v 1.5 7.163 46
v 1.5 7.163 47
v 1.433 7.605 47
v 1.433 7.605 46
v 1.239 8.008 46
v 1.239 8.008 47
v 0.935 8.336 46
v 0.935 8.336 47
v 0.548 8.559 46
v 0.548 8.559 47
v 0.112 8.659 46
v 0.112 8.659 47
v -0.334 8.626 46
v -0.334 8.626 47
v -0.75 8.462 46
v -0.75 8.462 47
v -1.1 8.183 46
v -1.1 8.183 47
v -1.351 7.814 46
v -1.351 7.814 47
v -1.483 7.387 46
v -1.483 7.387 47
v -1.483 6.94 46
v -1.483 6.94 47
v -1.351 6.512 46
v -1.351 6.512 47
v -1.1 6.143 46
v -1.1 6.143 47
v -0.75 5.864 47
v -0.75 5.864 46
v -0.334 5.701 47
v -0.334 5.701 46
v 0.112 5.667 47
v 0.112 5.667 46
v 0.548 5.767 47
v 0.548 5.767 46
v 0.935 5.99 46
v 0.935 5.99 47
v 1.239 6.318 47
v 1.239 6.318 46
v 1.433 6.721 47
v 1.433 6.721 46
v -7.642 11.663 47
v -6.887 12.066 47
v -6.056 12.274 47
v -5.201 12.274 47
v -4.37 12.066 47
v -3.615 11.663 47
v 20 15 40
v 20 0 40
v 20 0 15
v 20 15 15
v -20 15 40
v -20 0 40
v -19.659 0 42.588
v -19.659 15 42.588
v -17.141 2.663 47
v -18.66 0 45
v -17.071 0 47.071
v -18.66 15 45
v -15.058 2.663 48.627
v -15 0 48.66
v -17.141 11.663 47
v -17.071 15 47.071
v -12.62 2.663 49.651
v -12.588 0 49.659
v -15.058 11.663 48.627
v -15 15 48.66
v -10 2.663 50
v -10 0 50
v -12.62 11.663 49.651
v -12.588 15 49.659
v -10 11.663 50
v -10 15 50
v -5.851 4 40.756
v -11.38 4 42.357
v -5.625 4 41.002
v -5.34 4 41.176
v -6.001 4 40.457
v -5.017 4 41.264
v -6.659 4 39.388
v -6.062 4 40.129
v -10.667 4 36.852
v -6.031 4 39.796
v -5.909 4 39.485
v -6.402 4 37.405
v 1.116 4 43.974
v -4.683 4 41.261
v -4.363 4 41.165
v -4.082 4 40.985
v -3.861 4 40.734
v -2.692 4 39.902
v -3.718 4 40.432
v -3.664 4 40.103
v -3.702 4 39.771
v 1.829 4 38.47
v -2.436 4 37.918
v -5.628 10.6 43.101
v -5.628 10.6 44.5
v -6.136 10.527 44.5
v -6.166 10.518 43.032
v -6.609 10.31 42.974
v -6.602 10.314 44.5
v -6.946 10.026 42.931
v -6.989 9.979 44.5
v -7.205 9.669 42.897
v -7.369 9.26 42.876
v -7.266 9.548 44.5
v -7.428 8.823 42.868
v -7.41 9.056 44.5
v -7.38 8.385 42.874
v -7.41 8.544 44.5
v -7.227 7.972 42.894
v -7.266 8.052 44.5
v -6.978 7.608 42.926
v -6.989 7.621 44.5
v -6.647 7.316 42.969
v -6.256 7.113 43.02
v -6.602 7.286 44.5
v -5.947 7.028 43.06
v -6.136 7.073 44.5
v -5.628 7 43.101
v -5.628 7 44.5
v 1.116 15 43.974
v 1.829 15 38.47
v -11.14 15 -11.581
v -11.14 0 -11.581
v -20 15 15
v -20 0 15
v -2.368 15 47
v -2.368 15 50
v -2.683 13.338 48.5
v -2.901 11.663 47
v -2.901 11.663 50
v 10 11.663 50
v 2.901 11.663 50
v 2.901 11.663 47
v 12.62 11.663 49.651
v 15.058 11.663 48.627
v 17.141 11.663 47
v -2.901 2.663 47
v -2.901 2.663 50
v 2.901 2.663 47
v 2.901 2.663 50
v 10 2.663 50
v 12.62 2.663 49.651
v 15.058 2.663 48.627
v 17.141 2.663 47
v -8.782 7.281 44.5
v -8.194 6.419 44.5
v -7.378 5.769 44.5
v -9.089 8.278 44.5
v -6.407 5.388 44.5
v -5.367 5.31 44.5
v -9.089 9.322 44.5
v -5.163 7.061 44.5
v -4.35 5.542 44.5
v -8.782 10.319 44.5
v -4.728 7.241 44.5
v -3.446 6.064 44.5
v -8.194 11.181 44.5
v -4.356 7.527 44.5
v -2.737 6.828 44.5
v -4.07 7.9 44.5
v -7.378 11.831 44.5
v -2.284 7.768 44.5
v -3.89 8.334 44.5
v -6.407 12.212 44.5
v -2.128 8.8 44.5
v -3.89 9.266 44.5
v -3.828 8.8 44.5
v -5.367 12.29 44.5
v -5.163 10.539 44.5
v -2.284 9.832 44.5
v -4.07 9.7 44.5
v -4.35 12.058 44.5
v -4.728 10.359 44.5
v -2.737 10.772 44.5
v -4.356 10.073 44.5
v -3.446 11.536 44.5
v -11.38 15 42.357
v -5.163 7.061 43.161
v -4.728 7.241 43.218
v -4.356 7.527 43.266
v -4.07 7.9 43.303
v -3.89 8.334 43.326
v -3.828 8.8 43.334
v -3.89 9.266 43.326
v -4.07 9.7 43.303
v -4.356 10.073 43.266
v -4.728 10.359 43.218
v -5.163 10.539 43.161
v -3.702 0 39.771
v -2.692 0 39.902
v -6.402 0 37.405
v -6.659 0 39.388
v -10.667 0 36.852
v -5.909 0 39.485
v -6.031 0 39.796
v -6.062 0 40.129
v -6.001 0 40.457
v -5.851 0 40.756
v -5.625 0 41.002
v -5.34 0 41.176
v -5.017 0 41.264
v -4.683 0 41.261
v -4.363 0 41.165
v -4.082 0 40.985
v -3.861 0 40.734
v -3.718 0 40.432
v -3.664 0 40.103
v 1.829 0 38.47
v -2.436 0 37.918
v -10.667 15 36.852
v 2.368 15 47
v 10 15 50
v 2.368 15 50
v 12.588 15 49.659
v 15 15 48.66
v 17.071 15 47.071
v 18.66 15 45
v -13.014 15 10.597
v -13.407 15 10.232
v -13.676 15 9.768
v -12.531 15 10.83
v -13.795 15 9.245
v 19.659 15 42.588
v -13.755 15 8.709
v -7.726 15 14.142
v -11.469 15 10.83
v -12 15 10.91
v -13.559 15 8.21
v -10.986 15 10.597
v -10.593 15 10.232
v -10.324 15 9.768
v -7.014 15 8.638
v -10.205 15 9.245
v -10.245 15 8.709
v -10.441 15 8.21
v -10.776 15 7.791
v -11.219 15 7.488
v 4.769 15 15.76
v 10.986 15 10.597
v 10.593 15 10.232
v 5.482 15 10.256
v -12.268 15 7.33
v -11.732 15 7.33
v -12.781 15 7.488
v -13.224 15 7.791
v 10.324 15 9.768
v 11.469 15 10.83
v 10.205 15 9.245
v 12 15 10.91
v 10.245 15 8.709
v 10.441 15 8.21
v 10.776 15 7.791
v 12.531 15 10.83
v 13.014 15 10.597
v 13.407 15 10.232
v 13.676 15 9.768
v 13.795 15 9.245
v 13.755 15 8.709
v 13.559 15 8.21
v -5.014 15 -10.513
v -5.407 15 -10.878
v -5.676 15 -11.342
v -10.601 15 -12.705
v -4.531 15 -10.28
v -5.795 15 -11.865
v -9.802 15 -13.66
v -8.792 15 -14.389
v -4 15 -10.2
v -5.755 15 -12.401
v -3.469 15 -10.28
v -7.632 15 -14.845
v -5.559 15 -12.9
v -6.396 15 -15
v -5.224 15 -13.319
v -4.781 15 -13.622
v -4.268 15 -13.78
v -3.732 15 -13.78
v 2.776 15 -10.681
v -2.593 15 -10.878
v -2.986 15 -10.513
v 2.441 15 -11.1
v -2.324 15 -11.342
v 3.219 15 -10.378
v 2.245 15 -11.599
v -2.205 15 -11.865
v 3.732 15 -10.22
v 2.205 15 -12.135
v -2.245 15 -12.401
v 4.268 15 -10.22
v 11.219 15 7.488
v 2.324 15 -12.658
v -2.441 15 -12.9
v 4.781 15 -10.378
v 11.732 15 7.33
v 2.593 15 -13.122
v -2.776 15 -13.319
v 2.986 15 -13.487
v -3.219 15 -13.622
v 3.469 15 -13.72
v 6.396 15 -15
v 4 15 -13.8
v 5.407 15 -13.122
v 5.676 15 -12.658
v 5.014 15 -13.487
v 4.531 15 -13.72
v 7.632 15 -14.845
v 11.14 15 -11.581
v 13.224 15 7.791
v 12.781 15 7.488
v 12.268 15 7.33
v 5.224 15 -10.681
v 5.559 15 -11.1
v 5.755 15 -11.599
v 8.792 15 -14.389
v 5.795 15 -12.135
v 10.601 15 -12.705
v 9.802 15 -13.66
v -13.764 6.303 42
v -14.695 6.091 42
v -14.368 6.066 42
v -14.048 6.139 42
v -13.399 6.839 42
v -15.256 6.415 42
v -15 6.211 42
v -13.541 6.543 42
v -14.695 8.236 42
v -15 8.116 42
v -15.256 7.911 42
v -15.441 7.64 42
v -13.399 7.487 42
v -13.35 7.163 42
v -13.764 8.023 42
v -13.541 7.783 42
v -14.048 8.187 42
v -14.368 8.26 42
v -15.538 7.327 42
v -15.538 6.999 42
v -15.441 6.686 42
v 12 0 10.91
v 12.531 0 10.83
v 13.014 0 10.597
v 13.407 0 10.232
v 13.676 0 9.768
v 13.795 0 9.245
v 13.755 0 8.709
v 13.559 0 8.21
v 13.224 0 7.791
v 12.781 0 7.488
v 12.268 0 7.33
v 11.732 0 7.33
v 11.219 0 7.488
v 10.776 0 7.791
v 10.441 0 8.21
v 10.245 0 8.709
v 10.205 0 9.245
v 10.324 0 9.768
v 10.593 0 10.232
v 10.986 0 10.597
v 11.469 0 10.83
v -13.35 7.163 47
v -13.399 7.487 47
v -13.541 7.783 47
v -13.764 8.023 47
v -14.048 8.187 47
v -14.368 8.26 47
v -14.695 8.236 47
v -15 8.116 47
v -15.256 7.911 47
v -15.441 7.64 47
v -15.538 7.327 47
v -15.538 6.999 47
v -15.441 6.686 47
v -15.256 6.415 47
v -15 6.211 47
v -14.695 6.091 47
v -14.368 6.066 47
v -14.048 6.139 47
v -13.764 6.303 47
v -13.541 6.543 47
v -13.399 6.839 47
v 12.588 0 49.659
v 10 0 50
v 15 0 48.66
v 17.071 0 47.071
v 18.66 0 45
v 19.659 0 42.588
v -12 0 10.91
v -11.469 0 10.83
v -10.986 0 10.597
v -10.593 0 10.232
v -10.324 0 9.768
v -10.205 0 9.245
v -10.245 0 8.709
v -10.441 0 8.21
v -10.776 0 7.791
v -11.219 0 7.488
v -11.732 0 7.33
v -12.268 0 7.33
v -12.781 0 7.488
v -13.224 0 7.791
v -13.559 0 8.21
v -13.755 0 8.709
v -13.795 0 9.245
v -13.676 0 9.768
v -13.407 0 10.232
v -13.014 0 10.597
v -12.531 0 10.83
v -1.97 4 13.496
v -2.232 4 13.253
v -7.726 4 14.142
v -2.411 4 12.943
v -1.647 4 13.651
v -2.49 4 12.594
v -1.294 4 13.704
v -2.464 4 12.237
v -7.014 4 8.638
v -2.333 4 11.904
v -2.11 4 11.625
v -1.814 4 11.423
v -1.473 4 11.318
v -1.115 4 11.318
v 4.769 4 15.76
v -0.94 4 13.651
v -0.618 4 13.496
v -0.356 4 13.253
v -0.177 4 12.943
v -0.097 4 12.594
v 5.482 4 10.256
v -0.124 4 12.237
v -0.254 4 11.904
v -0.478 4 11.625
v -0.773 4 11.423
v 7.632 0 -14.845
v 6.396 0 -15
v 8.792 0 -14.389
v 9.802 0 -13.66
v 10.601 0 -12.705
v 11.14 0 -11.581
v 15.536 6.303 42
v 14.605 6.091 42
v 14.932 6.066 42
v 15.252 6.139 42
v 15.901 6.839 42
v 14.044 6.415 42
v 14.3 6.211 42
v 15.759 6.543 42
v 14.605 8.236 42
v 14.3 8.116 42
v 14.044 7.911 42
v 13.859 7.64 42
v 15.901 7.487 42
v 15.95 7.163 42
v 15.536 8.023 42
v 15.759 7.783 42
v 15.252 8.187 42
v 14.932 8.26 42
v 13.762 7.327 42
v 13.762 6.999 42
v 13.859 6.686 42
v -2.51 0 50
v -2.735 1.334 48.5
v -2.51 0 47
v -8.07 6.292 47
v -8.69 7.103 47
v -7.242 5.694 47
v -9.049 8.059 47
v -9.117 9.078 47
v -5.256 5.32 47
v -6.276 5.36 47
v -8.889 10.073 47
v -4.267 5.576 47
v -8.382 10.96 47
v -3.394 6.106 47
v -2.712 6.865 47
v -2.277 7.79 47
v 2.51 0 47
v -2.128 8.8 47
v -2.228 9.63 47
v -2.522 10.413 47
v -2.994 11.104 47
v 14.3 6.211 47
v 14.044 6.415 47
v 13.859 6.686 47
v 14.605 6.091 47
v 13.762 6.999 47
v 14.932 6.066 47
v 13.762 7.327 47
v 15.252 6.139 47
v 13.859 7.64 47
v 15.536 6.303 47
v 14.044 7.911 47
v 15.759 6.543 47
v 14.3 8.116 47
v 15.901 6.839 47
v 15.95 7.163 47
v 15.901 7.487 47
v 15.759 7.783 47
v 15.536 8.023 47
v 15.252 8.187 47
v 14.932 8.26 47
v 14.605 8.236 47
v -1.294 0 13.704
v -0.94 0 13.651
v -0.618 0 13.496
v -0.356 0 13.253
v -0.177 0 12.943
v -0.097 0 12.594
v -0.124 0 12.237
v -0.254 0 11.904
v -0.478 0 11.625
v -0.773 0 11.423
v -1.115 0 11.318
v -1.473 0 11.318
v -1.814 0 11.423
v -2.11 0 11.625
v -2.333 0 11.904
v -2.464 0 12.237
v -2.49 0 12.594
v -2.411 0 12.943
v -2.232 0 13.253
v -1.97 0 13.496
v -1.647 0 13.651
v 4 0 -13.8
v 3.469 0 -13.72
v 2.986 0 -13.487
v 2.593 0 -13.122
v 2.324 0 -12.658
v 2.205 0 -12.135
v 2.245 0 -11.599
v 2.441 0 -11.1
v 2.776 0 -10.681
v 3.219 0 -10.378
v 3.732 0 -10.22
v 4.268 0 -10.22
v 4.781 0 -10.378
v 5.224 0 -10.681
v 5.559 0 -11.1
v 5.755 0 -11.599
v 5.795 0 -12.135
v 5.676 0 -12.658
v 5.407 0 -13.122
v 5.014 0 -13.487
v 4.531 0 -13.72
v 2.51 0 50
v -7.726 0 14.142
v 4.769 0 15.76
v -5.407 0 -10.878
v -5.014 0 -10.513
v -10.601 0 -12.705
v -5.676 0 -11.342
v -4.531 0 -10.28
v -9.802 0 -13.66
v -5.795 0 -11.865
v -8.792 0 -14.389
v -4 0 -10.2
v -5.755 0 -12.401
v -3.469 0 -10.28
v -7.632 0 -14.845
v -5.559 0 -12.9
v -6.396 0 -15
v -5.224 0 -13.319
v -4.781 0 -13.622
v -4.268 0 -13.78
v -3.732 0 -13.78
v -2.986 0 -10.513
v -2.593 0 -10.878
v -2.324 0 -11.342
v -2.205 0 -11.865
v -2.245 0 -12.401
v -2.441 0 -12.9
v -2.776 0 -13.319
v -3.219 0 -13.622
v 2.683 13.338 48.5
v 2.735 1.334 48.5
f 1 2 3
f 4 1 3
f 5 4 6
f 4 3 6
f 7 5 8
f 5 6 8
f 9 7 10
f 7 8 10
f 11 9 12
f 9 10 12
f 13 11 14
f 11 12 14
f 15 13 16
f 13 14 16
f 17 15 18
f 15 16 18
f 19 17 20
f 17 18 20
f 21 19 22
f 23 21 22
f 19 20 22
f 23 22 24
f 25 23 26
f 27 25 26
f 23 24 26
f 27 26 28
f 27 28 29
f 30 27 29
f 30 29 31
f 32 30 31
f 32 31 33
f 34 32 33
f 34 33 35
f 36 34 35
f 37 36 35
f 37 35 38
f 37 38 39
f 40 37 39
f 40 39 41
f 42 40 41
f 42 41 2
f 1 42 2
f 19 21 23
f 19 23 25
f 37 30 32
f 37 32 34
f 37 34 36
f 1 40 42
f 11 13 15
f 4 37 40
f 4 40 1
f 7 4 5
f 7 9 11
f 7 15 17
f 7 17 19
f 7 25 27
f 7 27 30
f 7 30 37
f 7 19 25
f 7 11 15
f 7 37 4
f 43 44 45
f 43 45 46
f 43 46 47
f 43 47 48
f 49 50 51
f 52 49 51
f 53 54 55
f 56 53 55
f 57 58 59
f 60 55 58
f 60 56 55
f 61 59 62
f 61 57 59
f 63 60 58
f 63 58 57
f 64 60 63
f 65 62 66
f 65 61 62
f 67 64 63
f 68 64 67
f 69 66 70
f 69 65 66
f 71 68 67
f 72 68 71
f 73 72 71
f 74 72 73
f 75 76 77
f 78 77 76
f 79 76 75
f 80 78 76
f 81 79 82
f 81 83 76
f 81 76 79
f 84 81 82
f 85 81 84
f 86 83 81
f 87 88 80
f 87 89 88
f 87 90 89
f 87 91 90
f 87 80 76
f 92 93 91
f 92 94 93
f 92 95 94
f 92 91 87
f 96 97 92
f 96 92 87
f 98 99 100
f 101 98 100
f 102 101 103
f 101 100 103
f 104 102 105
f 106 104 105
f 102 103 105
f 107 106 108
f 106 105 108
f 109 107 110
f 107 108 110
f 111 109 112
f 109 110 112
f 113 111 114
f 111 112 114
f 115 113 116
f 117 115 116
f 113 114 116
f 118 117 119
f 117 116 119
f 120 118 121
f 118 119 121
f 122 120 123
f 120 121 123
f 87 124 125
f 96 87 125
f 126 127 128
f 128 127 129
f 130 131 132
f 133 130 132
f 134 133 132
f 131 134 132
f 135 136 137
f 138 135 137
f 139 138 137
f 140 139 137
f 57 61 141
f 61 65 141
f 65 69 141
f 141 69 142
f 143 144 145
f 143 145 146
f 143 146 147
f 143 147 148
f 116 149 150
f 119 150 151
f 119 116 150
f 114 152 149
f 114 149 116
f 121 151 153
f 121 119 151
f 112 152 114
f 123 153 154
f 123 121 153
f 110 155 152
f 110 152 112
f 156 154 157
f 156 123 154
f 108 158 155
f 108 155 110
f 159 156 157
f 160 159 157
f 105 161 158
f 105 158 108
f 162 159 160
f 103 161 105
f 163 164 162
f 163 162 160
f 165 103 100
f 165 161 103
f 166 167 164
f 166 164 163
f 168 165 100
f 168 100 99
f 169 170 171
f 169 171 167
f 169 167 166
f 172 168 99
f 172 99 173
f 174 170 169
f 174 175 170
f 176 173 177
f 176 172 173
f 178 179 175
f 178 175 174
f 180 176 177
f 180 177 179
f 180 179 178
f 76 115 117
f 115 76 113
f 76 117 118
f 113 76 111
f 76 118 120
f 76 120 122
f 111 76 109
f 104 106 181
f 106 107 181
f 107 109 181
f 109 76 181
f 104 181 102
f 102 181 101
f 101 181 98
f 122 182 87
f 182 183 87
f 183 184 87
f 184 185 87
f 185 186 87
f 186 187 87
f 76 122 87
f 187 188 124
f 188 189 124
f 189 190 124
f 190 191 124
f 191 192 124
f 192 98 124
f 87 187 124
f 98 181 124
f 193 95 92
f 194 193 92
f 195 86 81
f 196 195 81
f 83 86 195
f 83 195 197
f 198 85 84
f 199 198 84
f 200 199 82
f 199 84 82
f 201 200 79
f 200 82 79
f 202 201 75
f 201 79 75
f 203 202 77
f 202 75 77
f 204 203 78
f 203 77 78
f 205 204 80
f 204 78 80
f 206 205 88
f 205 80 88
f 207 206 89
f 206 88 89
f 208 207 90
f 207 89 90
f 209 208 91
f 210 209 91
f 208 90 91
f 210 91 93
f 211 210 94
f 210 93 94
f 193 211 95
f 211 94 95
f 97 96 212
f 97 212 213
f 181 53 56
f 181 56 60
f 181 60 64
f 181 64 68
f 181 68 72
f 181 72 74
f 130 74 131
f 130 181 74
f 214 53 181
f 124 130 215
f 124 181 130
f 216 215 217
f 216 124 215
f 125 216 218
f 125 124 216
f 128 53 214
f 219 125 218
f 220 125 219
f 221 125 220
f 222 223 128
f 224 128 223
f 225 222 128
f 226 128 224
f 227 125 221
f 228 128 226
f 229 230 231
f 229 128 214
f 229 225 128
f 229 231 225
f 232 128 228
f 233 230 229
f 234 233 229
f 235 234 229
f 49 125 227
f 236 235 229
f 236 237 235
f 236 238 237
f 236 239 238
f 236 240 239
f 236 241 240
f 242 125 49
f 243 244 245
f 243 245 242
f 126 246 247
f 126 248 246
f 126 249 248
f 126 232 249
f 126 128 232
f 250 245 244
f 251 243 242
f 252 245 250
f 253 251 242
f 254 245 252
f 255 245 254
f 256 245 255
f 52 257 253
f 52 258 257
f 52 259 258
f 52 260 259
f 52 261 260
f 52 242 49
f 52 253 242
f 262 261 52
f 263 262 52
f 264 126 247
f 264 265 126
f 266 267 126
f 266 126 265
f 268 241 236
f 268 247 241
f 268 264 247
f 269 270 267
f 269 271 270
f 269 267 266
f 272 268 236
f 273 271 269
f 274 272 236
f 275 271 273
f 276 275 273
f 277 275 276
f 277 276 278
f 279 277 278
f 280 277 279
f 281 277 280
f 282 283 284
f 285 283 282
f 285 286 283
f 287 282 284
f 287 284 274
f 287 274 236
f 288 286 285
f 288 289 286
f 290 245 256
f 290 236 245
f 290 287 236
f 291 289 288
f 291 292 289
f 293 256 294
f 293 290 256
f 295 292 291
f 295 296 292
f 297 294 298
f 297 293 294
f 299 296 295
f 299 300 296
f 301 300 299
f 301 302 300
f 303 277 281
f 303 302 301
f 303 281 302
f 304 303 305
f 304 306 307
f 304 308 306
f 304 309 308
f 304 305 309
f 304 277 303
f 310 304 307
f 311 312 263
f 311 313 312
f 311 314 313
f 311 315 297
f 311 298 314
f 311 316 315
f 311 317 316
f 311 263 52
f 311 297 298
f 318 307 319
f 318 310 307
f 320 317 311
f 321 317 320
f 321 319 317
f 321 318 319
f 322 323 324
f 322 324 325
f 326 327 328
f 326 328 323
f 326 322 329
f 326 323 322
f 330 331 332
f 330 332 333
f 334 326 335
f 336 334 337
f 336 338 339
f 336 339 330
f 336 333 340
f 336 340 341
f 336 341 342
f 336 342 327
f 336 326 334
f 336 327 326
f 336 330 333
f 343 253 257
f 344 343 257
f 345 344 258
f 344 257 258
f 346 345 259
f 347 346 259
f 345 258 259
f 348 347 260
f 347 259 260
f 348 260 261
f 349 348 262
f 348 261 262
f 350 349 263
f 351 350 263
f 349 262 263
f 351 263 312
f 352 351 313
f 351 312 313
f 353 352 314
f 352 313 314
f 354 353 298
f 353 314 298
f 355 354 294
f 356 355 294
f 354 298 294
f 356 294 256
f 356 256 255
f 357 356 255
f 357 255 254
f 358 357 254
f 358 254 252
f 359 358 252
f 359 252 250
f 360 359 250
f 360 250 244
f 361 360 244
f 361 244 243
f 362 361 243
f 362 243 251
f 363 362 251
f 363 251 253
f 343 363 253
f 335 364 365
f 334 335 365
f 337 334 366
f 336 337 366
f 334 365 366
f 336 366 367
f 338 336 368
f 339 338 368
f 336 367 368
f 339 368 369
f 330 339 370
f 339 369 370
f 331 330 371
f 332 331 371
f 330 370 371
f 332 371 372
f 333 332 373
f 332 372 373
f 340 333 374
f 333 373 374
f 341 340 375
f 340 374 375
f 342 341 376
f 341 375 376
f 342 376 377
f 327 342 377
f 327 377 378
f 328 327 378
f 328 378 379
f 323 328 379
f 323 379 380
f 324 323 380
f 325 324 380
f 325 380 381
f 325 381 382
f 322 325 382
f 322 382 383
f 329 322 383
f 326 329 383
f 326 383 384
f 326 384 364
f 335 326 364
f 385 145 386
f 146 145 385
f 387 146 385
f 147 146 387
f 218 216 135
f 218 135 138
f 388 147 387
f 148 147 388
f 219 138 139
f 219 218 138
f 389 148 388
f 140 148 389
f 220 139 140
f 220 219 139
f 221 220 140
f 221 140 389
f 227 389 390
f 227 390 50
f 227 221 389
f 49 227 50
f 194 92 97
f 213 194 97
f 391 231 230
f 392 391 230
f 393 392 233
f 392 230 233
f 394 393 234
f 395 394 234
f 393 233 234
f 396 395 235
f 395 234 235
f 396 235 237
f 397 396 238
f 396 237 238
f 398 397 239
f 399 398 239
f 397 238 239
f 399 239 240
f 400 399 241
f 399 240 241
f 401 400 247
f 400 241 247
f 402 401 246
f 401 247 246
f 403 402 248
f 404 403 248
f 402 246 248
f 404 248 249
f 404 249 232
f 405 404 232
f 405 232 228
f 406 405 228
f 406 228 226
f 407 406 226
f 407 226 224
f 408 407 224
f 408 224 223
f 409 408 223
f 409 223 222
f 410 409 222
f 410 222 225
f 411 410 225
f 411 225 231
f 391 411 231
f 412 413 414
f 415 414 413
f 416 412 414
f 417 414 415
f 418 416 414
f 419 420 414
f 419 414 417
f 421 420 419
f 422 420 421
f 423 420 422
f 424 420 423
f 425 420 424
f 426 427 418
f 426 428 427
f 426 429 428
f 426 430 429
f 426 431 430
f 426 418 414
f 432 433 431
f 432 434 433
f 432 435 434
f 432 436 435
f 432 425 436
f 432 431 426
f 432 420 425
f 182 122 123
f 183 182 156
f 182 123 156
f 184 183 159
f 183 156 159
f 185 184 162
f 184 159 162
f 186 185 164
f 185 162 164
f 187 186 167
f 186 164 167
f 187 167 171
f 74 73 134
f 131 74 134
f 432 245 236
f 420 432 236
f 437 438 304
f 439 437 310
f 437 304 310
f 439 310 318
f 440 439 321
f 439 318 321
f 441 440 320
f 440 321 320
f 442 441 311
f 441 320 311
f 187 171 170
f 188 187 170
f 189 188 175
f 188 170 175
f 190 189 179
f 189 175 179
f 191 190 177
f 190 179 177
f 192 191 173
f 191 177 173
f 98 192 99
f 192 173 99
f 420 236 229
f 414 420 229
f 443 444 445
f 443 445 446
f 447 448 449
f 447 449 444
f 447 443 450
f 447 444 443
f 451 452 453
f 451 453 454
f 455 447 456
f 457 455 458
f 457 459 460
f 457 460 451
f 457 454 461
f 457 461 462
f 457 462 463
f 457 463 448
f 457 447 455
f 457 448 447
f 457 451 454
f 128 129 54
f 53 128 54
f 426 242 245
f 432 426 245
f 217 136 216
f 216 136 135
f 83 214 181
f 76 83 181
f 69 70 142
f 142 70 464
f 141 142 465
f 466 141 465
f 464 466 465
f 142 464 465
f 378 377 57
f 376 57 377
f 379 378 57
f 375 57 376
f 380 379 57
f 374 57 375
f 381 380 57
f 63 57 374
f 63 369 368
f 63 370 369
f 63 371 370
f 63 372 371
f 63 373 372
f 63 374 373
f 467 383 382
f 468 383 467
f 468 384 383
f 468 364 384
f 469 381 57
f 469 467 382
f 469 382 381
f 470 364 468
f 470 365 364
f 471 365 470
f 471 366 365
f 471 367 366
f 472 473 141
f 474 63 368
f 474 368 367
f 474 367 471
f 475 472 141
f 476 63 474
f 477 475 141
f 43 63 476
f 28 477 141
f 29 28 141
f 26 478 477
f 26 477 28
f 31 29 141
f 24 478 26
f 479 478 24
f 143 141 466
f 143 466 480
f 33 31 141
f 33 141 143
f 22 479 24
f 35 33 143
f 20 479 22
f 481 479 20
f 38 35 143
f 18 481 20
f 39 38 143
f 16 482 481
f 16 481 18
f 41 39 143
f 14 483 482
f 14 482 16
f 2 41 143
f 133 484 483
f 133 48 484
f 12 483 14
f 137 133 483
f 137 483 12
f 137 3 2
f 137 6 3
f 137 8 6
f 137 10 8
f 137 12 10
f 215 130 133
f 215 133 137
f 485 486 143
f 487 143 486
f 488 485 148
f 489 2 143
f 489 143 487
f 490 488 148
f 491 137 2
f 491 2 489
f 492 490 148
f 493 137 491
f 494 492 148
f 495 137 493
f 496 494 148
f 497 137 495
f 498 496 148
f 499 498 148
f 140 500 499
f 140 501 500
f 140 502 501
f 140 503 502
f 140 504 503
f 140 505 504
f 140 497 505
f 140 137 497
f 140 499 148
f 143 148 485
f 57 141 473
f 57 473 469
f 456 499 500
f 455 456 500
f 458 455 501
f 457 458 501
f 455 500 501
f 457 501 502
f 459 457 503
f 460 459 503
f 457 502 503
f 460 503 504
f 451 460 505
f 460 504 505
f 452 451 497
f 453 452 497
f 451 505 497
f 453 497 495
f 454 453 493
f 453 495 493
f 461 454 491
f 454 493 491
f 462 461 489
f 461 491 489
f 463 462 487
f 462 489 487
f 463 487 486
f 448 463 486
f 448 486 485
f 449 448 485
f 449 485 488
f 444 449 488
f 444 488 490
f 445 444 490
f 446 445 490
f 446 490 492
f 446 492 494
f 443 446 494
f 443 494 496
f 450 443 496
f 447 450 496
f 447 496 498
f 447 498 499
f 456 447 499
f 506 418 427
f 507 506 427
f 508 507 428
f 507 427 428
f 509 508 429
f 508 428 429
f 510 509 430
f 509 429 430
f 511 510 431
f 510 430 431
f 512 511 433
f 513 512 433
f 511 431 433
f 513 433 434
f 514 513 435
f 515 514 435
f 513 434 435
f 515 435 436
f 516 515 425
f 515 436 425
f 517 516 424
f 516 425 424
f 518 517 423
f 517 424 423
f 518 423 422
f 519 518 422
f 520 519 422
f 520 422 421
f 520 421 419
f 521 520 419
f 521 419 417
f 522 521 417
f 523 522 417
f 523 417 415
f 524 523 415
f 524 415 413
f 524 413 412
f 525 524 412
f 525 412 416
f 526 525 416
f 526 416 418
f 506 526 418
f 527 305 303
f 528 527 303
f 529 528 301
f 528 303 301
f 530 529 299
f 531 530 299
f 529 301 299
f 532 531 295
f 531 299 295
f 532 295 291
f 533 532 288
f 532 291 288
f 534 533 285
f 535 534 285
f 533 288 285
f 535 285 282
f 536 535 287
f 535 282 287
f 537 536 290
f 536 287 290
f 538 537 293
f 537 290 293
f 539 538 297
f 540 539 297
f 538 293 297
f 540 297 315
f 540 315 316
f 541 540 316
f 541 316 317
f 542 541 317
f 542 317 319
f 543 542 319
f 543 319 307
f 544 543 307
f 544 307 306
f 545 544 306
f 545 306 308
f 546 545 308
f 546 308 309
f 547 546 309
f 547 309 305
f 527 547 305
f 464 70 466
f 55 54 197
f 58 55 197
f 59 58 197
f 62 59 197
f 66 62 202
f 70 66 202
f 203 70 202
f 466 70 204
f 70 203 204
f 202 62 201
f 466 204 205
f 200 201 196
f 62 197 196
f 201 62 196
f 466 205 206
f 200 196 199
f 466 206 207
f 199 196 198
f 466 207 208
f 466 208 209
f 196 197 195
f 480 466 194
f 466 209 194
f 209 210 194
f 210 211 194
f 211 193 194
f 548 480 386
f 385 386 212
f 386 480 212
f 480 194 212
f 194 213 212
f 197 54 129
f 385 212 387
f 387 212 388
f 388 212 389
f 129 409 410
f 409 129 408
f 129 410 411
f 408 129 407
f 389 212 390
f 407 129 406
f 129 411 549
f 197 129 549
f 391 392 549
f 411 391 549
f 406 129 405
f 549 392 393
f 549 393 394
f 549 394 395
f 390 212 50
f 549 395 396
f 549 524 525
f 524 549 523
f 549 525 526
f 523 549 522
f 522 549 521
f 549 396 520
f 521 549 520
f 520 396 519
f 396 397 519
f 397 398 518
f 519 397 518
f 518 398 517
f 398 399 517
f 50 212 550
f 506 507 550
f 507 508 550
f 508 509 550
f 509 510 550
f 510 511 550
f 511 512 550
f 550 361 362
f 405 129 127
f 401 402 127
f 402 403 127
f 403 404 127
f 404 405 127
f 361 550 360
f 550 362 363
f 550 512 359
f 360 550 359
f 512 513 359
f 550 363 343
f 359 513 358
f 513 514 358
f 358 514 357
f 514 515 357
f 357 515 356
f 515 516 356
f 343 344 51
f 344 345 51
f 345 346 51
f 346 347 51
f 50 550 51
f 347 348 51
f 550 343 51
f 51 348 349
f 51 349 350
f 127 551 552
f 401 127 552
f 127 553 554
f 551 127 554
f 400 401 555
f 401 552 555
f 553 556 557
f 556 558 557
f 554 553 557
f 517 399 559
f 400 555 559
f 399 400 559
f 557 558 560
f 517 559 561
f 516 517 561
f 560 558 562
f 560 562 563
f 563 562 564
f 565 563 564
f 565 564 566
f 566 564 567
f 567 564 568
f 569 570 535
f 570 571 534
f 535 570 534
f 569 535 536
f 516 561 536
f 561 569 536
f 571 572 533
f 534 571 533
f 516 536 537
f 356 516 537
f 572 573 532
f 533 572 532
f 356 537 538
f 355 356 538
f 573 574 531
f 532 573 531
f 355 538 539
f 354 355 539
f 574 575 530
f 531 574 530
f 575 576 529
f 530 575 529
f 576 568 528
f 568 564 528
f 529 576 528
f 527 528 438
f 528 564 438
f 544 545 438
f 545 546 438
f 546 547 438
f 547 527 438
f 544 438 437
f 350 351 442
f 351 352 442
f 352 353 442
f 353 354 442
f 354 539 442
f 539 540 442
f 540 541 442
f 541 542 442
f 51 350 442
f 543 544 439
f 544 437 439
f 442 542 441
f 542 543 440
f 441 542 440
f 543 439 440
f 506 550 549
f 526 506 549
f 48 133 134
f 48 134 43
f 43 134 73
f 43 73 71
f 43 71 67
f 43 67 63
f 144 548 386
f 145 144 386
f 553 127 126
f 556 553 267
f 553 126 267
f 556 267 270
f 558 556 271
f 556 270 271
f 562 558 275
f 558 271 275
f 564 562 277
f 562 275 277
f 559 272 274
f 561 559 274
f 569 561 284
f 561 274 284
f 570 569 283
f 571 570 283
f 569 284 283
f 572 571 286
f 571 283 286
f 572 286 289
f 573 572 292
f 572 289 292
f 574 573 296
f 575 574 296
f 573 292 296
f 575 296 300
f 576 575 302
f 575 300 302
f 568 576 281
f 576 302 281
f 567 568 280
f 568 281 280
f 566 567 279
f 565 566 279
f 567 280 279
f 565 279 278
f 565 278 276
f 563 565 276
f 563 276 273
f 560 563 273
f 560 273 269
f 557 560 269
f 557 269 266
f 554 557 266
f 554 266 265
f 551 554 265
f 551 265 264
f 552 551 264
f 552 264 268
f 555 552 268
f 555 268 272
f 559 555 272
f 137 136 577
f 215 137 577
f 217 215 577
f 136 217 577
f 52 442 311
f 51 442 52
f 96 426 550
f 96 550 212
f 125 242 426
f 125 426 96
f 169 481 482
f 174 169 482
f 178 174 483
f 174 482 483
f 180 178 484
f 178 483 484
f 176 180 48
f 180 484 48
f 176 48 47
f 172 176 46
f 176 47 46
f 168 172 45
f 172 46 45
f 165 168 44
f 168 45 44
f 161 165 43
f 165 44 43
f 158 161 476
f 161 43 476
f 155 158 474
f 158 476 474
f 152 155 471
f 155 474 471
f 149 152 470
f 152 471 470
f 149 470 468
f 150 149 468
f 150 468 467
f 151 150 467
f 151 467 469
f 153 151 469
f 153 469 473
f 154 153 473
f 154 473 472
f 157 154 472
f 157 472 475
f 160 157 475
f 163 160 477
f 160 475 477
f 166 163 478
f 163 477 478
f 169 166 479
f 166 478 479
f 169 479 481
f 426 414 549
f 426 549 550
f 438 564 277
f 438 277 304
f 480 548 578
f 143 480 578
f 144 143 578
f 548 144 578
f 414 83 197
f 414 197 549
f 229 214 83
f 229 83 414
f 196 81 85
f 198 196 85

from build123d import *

# Parameters (mm, degrees)
BOSS_EXTRUDE1_DEPTH = 15
SKETCH2_R           = 1.8
CUT_EXTRUDE1_DEPTH  = 56.901699437
FILLET2_R           = 5
CUT_EXTRUDE2_DEPTH  = 56.901699437
CUT_EXTRUDE3_DEPTH  = 11
SKETCH3_R           = 1.2
CUT_EXTRUDE4_DEPTH  = 11
FILLET3_R           = 10
SKETCH4_R           = 1.1
CUT_EXTRUDE5_DEPTH  = 3
SKETCH4_2_R         = 1.1
CUT_EXTRUDE6_DEPTH  = 8
SKETCH4_4_R         = 1.5
CUT_EXTRUDE7_DEPTH  = 4
CUT_EXTRUDE8_DEPTH  = 4
SKETCH6_R           = 3.5
SKETCH6_R_2         = 1.8
CUT_EXTRUDE9_DEPTH  = 2.5
SKETCH6_2_R         = 1.8
CUT_EXTRUDE10_DEPTH = 13.5


with BuildPart() as part:
    # Sketch1 → Boss-Extrude1 (new body)
    with BuildSketch(Plane(origin=(0, 0, 0), x_dir=(1, 0, 0), z_dir=(0, 1, 0))):
        Polygon((-10, 15), (-20, -15), (-20, -50), (20, -50), (20, -15), (10, 15), align=None)
    extrude(amount=BOSS_EXTRUDE1_DEPTH)

    # Sketch2 → Cut-Extrude1 (cut, through all)
    with BuildSketch(Plane(origin=(0, 15, 0), x_dir=(1, 0, 0), z_dir=(0, 1, 0))):
        with Locations((-4, 12)):
            Circle(SKETCH2_R)
        with Locations((4, 12)):
            Circle(SKETCH2_R)
        with Locations((12, -9.11)):
            Circle(SKETCH2_R)
        with Locations((-12, -9.11)):
            Circle(SKETCH2_R)
    extrude(amount=-CUT_EXTRUDE1_DEPTH, mode=Mode.SUBTRACT)

    # Fillet2
    fillet2_edges = [part.edges().sort_by_distance(p)[0] for p in [
        (-10, 7.5, -15),
        (10, 7.5, -15),
    ]]
    fillet(fillet2_edges, radius=FILLET2_R)

    # Sketch2<3> → Cut-Extrude2 (cut, through all)
    with BuildSketch(Plane(origin=(0, 15, 0), x_dir=(1, 0, 0), z_dir=(0, 1, 0))):
        Polygon((-10.666887738, -36.852464686), (1.828807817, -38.470362271), (4.769272475, -15.75993146), (-7.72642308, -14.142033875), align=None)
    extrude(amount=-CUT_EXTRUDE2_DEPTH, mode=Mode.SUBTRACT)

    # Sketch2<4> → Cut-Extrude3 (cut)
    with BuildSketch(Plane(origin=(0, 15, 0), x_dir=(1, 0, 0), z_dir=(0, 1, 0))):
        Polygon((1.116162452, -43.974418646), (1.828807817, -38.470362271), (-10.666887738, -36.852464686), (-11.379533103, -42.356521061), align=None)
        Polygon((-7.72642308, -14.142033875), (4.769272475, -15.75993146), (5.481917839, -10.255875085), (-7.013777716, -8.6379775), align=None)
    extrude(amount=-CUT_EXTRUDE3_DEPTH, mode=Mode.SUBTRACT)

    # Sketch3 → Cut-Extrude4 (cut)
    with BuildSketch(Plane(origin=(0, 4, 0), x_dir=(1, 0, 0), z_dir=(0, 1, 0))):
        with Locations((-1.293710172, -12.504467624)):
            Circle(SKETCH3_R)
        with Locations((-4.863357224, -40.074335595)):
            Circle(SKETCH3_R)
    extrude(amount=-CUT_EXTRUDE4_DEPTH, mode=Mode.SUBTRACT)

    # Fillet3
    fillet3_edges = [part.edges().sort_by_distance(p)[0] for p in [
        (20, 7.5, 50),
        (-20, 7.5, 50),
    ]]
    fillet(fillet3_edges, radius=FILLET3_R)

    # Sketch4 → Cut-Extrude5 (cut)
    with BuildSketch(Plane.XY.offset(50)):
        with BuildLine():
            Line((19, 2.663134509), (19, 11.663134509))
            Line((19, 11.663134509), (2.90110314, 11.663134509))
            add(Edge.make_bspline(
                [(2.90110314, 11.663134509), (2.706802795, 13.50022371), (2.368423756, 15)],
                knots=[5.097231356, 5.097231356, 5.097231356, 5.477961769, 5.477961769, 5.477961769], degree=2, weights=[1, 0.899743473, 0.831672604]))
            Line((2.368423756, 15), (-2.368423756, 15))
            add(Edge.make_bspline(
                [(-2.368423756, 15), (-2.706802795, 13.50022371), (-2.90110314, 11.663134509)],
                knots=[7.088408845, 7.088408845, 7.088408845, 7.469139258, 7.469139258, 7.469139258], degree=2, weights=[0.831672604, 0.899743473, 1]))
            Line((-2.90110314, 11.663134509), (-19, 11.663134509))
            Line((-19, 11.663134509), (-19, 2.663134509))
            Line((-19, 2.663134509), (-2.90110314, 2.663134509))
            add(Edge.make_bspline(
                [(-2.90110314, 2.663134509), (-2.750081515, 1.235241026), (-2.509684133, 0)],
                knots=[1.955638703, 1.955638703, 1.955638703, 2.258324061, 2.258324061, 2.258324061], degree=2, weights=[1, 0.920294828, 0.860932427]))
            Line((-2.509684133, 0), (2.509684133, 0))
            add(Edge.make_bspline(
                [(2.509684133, 0), (2.750081515, 1.235241026), (2.90110314, 2.663134509)],
                knots=[4.024861246, 4.024861246, 4.024861246, 4.327546605, 4.327546605, 4.327546605], degree=2, weights=[0.860932427, 0.920294828, 1]))
            Line((2.90110314, 2.663134509), (19, 2.663134509))
        make_face()
        with Locations((14.85, 7.163134509)):
            Circle(SKETCH4_R, mode=Mode.SUBTRACT)
        with Locations((-14.45, 7.163134509)):
            Circle(SKETCH4_R, mode=Mode.SUBTRACT)
    extrude(amount=-CUT_EXTRUDE5_DEPTH, mode=Mode.SUBTRACT)

    # Sketch4<2> → Cut-Extrude6 (cut)
    with BuildSketch(Plane.XY.offset(50)):
        with Locations((-14.45, 7.163134509)):
            Circle(SKETCH4_2_R)
        with Locations((14.85, 7.163134509)):
            Circle(SKETCH4_2_R)
    extrude(amount=-CUT_EXTRUDE6_DEPTH, mode=Mode.SUBTRACT)

    # Sketch4<4> → Cut-Extrude7 (cut)
    with BuildSketch(Plane.XY.offset(50)):
        with Locations((0, 7.163134509)):
            Circle(SKETCH4_4_R)
    extrude(amount=-CUT_EXTRUDE7_DEPTH, mode=Mode.SUBTRACT)

    # Sketch5 → Cut-Extrude8 (cut)
    with BuildSketch(Plane(origin=(0, 4, 0), x_dir=(1, 0, 0), z_dir=(0, 1, 0))):
        with BuildLine():
            Line((-2.435596222, -37.918222619), (-6.402483699, -37.404604338))
            Line((-6.402483699, -37.404604338), (-6.65929284, -39.388048077))
            Line((-6.65929284, -39.388048077), (-5.908796102, -39.485219687))
            ThreePointArc((-5.908796102, -39.485219687), (-4.70927174, -38.884269352), (-3.702354234, -39.770901821))
            Line((-3.702354234, -39.770901821), (-2.692405362, -39.901666358))
            Line((-2.692405362, -39.901666358), (-2.435596222, -37.918222619))
        make_face()
    extrude(amount=-CUT_EXTRUDE8_DEPTH, mode=Mode.SUBTRACT)

    # Sketch6 → Cut-Extrude9 (cut)
    with BuildSketch(Plane.XY.offset(47)):
        with Locations((-5.628460917, 8.8)):
            Circle(SKETCH6_R)
        with Locations((-5.628460917, 8.8)):
            Circle(SKETCH6_R_2, mode=Mode.SUBTRACT)
    extrude(amount=-CUT_EXTRUDE9_DEPTH, mode=Mode.SUBTRACT)

    # Sketch6<2> → Cut-Extrude10 (cut)
    with BuildSketch(Plane.XY.offset(47)):
        with Locations((-5.628460917, 8.8)):
            Circle(SKETCH6_2_R)
    extrude(amount=-CUT_EXTRUDE10_DEPTH, mode=Mode.SUBTRACT)


solid = part.part
